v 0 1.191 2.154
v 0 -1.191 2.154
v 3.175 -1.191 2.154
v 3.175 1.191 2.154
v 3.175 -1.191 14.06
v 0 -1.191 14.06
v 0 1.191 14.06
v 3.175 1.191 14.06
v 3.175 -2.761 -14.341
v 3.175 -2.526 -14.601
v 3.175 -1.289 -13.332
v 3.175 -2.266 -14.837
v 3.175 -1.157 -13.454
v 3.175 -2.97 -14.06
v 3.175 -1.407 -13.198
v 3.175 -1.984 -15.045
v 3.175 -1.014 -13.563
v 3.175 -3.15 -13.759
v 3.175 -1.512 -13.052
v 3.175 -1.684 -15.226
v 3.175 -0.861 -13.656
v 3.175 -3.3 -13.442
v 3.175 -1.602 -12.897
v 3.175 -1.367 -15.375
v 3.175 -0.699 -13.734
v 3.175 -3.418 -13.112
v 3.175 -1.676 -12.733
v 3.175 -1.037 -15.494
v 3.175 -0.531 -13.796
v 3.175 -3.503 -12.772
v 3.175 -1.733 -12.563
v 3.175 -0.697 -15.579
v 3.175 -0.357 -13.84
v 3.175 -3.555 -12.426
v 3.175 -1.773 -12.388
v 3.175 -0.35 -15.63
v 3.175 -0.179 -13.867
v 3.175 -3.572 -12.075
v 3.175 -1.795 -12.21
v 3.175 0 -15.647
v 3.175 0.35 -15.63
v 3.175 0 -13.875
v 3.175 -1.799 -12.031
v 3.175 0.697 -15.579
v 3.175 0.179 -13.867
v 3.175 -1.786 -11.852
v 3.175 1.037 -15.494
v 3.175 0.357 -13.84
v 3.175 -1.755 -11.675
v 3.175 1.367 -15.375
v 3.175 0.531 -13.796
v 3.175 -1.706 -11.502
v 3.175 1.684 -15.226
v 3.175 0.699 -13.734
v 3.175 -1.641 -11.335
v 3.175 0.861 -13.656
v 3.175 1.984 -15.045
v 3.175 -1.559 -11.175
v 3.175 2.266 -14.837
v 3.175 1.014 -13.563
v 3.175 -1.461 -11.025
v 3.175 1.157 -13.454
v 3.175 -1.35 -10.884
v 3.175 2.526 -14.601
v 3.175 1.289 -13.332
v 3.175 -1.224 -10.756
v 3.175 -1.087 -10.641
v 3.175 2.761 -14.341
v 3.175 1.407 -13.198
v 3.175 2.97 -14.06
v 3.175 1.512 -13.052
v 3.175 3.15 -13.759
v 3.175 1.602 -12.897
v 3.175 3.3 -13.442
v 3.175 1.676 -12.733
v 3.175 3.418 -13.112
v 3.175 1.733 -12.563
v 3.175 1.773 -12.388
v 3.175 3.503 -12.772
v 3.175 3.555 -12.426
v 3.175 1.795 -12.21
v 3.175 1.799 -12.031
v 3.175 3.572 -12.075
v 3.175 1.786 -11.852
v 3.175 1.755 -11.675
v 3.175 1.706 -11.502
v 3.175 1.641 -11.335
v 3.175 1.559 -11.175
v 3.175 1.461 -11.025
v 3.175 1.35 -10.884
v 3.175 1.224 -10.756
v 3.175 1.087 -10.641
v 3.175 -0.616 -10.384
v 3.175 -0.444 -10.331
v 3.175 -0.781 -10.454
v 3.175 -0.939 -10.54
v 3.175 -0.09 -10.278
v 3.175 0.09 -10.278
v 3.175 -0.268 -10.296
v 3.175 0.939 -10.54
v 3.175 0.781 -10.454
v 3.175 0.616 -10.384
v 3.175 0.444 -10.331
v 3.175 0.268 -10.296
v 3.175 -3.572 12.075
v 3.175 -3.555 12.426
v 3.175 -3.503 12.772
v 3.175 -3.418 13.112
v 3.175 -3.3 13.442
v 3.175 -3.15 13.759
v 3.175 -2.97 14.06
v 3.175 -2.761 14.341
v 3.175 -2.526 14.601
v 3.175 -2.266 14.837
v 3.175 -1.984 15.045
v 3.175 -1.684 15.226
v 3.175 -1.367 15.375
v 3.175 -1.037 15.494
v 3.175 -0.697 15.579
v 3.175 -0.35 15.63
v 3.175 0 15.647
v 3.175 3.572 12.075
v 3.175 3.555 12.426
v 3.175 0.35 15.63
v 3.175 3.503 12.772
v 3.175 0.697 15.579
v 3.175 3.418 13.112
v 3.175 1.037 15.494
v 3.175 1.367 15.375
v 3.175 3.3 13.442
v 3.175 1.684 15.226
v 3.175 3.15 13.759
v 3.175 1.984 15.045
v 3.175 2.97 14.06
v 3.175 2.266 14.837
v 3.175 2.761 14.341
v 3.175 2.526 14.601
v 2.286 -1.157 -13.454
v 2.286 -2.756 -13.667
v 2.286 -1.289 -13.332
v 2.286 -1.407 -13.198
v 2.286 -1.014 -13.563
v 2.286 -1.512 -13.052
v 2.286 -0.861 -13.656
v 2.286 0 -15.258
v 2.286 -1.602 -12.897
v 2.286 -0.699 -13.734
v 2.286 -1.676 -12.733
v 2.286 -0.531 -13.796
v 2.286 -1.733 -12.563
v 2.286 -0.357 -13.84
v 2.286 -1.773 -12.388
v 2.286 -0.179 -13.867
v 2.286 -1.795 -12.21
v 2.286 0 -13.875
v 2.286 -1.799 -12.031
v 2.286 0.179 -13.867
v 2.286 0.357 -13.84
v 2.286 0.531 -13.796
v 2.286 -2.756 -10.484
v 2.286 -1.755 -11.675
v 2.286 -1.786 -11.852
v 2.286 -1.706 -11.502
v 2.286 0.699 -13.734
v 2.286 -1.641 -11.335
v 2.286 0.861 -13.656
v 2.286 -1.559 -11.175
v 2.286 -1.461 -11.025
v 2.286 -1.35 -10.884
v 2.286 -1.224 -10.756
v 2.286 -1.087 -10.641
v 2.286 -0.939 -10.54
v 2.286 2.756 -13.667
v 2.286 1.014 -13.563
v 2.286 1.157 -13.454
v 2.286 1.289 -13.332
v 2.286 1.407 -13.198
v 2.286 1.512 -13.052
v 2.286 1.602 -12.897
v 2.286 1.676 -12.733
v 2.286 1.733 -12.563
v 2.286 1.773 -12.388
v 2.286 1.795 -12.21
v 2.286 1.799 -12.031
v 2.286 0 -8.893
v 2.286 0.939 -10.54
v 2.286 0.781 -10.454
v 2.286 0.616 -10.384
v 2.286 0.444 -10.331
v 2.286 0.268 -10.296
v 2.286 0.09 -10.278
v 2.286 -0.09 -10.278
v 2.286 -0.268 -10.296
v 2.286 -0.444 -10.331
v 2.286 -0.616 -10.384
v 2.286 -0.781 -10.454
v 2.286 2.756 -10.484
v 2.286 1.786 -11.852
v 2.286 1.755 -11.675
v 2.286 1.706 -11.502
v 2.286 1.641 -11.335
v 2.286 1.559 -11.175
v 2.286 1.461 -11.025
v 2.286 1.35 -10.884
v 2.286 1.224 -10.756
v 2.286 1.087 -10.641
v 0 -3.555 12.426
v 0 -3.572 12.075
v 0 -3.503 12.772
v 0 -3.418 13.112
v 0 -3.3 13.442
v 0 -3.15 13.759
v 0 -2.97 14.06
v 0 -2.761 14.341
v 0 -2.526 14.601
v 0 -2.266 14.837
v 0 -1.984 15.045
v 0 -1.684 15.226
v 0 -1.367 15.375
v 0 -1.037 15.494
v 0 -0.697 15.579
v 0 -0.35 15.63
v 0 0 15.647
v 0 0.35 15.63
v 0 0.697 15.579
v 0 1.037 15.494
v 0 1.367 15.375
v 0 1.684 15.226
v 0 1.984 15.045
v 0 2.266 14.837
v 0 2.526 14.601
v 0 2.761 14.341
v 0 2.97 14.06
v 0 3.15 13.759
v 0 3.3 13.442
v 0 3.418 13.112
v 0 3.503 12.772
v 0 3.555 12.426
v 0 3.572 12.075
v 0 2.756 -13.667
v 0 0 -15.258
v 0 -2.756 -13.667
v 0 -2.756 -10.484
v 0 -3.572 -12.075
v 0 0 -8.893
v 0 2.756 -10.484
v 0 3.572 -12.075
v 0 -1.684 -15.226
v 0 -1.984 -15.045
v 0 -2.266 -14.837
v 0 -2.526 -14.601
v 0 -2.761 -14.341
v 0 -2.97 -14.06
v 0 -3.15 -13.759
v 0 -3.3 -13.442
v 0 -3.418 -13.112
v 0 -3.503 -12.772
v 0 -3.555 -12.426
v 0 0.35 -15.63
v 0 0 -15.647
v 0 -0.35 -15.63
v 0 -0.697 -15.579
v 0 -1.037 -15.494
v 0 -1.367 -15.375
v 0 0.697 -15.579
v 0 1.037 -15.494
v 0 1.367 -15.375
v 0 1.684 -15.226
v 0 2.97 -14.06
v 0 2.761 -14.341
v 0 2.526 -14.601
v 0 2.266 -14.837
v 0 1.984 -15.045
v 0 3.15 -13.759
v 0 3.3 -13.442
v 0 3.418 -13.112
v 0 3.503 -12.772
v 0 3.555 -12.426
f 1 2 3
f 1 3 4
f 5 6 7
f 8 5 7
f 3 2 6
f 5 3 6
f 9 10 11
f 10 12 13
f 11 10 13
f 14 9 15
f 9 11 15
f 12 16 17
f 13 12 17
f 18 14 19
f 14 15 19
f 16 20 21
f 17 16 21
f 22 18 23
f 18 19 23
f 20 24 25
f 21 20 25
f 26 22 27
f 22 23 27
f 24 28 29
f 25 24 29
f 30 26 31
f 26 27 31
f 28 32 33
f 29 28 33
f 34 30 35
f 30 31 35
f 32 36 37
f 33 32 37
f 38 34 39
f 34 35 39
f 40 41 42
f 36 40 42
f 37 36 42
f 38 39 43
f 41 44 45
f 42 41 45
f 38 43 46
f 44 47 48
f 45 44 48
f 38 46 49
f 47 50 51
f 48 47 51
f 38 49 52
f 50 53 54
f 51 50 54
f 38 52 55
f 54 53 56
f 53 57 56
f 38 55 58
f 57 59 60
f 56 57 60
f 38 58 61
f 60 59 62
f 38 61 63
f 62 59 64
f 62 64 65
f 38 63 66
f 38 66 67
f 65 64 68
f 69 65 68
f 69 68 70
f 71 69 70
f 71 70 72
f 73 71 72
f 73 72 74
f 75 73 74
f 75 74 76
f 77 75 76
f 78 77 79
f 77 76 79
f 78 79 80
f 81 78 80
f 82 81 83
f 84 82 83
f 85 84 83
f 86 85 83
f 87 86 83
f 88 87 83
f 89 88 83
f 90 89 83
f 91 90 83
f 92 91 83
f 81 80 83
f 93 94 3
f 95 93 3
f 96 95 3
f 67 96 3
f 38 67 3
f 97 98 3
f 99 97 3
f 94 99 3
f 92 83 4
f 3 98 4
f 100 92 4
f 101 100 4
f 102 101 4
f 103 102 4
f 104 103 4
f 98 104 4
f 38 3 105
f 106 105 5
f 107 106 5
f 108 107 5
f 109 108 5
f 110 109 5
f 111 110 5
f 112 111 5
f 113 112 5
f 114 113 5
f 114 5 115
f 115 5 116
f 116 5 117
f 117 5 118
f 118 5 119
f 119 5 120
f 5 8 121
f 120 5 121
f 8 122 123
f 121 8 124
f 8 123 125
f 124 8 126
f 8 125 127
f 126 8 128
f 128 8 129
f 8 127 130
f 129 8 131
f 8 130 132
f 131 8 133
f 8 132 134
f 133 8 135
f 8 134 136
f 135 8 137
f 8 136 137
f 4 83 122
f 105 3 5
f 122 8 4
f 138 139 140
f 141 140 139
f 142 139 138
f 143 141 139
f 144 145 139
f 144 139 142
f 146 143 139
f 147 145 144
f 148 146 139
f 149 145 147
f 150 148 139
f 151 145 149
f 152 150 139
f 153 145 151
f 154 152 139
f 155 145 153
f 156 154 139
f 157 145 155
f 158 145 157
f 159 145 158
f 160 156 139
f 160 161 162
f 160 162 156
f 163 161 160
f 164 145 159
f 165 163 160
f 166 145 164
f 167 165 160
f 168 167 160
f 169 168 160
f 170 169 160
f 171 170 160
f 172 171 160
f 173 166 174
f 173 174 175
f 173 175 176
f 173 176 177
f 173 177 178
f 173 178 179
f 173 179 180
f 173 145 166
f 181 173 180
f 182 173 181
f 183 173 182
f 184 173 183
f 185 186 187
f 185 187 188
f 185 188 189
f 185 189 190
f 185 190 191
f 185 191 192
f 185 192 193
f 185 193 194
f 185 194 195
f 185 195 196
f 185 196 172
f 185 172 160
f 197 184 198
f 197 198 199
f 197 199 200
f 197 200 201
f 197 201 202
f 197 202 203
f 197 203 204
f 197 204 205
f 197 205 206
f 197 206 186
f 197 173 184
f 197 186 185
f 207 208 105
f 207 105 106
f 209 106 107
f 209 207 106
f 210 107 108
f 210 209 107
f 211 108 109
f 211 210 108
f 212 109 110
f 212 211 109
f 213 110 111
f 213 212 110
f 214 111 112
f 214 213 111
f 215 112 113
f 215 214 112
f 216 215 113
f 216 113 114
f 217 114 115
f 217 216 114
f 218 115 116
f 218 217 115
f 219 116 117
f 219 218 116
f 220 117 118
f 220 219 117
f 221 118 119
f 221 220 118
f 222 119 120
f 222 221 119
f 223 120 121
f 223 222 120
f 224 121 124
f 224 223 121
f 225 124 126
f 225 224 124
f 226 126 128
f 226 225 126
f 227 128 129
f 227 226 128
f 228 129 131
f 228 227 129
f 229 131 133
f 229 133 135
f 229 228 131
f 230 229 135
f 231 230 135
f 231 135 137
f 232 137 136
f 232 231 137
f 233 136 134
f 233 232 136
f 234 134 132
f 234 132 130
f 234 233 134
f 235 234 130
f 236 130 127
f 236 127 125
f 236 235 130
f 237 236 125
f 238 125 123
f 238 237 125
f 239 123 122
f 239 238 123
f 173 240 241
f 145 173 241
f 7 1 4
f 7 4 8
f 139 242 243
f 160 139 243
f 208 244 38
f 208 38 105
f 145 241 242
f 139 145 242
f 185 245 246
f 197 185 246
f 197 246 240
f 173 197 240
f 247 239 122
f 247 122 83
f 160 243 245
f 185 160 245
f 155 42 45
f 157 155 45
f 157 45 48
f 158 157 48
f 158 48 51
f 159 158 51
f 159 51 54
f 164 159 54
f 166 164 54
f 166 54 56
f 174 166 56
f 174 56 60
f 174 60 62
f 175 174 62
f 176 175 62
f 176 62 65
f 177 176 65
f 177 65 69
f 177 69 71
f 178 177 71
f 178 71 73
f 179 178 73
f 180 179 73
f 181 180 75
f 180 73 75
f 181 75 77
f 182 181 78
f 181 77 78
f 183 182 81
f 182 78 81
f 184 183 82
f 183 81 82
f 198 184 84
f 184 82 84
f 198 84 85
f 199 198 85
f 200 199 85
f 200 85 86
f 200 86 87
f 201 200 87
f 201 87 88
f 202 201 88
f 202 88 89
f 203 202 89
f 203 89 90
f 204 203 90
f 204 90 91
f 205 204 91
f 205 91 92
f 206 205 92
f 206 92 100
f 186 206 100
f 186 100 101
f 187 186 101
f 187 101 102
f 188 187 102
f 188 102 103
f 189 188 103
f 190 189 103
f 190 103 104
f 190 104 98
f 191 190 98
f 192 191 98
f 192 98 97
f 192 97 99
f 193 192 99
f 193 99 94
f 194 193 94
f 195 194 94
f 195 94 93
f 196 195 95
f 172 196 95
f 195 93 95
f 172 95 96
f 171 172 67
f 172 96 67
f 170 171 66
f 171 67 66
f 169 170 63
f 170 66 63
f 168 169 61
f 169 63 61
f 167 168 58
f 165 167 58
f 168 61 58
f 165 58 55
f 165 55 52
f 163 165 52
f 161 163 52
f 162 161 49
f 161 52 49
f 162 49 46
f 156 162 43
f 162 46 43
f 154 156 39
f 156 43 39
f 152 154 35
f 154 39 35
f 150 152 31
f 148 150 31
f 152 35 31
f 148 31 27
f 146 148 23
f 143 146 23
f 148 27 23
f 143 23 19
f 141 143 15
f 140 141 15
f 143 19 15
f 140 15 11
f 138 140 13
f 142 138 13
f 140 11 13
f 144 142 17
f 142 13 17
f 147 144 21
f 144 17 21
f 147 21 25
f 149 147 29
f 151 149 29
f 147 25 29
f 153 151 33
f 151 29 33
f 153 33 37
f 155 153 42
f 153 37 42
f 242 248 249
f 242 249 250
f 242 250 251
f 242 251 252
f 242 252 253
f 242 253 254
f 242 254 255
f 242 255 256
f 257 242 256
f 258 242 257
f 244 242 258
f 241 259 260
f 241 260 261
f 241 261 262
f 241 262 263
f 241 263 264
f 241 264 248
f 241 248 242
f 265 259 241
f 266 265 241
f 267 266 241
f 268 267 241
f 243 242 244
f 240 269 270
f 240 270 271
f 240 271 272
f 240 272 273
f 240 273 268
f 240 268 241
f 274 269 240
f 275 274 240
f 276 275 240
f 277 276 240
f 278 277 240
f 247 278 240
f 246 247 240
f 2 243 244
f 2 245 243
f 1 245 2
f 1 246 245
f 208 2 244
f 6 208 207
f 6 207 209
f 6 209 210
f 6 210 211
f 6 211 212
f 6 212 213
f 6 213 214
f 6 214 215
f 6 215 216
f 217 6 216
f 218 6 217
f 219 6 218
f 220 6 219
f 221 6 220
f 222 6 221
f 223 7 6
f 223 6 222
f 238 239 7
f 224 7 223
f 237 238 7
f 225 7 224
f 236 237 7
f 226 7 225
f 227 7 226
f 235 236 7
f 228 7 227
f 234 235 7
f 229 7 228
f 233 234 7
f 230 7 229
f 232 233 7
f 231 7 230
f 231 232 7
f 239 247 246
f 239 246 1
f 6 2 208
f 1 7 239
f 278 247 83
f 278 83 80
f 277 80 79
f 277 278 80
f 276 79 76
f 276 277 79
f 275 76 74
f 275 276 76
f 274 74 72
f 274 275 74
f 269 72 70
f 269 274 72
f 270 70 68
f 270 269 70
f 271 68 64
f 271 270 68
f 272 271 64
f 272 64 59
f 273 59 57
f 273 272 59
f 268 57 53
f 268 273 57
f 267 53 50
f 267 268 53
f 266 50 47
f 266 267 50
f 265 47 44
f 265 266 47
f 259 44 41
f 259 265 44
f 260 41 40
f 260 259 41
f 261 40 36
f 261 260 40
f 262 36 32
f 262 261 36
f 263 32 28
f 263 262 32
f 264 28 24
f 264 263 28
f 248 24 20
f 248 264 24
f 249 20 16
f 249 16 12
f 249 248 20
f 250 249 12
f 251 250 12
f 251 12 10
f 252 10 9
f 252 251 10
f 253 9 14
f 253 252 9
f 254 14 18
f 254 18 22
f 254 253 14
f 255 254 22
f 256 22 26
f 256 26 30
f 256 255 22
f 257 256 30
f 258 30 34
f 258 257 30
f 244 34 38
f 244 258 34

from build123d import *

# Parameters (mm, degrees)
BOSS_EXTRUDE1_DEPTH      = 3.175
M3_CLEARANCE_HOLE1_D     = 3.6
M3_CLEARANCE_HOLE1_DEPTH = 7.62
M3_CLEARANCE_HOLE1_TIP   = 1.081549114
SKETCH9_W                = 11.90625
SKETCH9_H                = 2.38125
CUT_EXTRUDE1_DEPTH       = 17.360887498
CUT_EXTRUDE2_DEPTH       = 2.286


with BuildPart() as part:
    # Sketch1 → Boss-Extrude1 (new body)
    with BuildSketch(Plane(origin=(0, 0, 0), x_dir=(0, 0, -1), z_dir=(1, 0, 0))):
        with BuildLine():
            Line((-12.075480167, 3.571875), (12.075480167, 3.571875))
            ThreePointArc((12.075480167, 3.571875), (15.647355167, 0), (12.075480167, -3.571875))
            Line((12.075480167, -3.571875), (-12.075480167, -3.571875))
            ThreePointArc((-12.075480167, -3.571875), (-15.647355167, 0), (-12.075480167, 3.571875))
        make_face()
    extrude(amount=BOSS_EXTRUDE1_DEPTH)

    # M3 Clearance Hole1
    with Locations(Plane.ZY):
        with Locations((-12.075480167, 0)):
            Hole(M3_CLEARANCE_HOLE1_D / 2, depth=M3_CLEARANCE_HOLE1_DEPTH)
            with Locations((0, 0, -(M3_CLEARANCE_HOLE1_DEPTH + M3_CLEARANCE_HOLE1_TIP / 2))):  # 118° drill point
                Cone(0, M3_CLEARANCE_HOLE1_D / 2, M3_CLEARANCE_HOLE1_TIP, mode=Mode.SUBTRACT)

    # Sketch9 → Cut-Extrude1 (cut, through all)
    with BuildSketch(Plane.ZY):
        with Locations((8.106730167, 0)):
            Rectangle(SKETCH9_W, SKETCH9_H)
    extrude(amount=-CUT_EXTRUDE1_DEPTH, mode=Mode.SUBTRACT)

    # Sketch10 → Cut-Extrude2 (cut)
    with BuildSketch(Plane.ZY):
        Polygon((-10.48436056, -2.7559), (-8.893240953, 0), (-10.48436056, 2.7559), (-13.666599774, 2.7559), (-15.257719381, 0), (-13.666599774, -2.7559), align=None)
    extrude(amount=-CUT_EXTRUDE2_DEPTH, mode=Mode.SUBTRACT)


solid = part.part
